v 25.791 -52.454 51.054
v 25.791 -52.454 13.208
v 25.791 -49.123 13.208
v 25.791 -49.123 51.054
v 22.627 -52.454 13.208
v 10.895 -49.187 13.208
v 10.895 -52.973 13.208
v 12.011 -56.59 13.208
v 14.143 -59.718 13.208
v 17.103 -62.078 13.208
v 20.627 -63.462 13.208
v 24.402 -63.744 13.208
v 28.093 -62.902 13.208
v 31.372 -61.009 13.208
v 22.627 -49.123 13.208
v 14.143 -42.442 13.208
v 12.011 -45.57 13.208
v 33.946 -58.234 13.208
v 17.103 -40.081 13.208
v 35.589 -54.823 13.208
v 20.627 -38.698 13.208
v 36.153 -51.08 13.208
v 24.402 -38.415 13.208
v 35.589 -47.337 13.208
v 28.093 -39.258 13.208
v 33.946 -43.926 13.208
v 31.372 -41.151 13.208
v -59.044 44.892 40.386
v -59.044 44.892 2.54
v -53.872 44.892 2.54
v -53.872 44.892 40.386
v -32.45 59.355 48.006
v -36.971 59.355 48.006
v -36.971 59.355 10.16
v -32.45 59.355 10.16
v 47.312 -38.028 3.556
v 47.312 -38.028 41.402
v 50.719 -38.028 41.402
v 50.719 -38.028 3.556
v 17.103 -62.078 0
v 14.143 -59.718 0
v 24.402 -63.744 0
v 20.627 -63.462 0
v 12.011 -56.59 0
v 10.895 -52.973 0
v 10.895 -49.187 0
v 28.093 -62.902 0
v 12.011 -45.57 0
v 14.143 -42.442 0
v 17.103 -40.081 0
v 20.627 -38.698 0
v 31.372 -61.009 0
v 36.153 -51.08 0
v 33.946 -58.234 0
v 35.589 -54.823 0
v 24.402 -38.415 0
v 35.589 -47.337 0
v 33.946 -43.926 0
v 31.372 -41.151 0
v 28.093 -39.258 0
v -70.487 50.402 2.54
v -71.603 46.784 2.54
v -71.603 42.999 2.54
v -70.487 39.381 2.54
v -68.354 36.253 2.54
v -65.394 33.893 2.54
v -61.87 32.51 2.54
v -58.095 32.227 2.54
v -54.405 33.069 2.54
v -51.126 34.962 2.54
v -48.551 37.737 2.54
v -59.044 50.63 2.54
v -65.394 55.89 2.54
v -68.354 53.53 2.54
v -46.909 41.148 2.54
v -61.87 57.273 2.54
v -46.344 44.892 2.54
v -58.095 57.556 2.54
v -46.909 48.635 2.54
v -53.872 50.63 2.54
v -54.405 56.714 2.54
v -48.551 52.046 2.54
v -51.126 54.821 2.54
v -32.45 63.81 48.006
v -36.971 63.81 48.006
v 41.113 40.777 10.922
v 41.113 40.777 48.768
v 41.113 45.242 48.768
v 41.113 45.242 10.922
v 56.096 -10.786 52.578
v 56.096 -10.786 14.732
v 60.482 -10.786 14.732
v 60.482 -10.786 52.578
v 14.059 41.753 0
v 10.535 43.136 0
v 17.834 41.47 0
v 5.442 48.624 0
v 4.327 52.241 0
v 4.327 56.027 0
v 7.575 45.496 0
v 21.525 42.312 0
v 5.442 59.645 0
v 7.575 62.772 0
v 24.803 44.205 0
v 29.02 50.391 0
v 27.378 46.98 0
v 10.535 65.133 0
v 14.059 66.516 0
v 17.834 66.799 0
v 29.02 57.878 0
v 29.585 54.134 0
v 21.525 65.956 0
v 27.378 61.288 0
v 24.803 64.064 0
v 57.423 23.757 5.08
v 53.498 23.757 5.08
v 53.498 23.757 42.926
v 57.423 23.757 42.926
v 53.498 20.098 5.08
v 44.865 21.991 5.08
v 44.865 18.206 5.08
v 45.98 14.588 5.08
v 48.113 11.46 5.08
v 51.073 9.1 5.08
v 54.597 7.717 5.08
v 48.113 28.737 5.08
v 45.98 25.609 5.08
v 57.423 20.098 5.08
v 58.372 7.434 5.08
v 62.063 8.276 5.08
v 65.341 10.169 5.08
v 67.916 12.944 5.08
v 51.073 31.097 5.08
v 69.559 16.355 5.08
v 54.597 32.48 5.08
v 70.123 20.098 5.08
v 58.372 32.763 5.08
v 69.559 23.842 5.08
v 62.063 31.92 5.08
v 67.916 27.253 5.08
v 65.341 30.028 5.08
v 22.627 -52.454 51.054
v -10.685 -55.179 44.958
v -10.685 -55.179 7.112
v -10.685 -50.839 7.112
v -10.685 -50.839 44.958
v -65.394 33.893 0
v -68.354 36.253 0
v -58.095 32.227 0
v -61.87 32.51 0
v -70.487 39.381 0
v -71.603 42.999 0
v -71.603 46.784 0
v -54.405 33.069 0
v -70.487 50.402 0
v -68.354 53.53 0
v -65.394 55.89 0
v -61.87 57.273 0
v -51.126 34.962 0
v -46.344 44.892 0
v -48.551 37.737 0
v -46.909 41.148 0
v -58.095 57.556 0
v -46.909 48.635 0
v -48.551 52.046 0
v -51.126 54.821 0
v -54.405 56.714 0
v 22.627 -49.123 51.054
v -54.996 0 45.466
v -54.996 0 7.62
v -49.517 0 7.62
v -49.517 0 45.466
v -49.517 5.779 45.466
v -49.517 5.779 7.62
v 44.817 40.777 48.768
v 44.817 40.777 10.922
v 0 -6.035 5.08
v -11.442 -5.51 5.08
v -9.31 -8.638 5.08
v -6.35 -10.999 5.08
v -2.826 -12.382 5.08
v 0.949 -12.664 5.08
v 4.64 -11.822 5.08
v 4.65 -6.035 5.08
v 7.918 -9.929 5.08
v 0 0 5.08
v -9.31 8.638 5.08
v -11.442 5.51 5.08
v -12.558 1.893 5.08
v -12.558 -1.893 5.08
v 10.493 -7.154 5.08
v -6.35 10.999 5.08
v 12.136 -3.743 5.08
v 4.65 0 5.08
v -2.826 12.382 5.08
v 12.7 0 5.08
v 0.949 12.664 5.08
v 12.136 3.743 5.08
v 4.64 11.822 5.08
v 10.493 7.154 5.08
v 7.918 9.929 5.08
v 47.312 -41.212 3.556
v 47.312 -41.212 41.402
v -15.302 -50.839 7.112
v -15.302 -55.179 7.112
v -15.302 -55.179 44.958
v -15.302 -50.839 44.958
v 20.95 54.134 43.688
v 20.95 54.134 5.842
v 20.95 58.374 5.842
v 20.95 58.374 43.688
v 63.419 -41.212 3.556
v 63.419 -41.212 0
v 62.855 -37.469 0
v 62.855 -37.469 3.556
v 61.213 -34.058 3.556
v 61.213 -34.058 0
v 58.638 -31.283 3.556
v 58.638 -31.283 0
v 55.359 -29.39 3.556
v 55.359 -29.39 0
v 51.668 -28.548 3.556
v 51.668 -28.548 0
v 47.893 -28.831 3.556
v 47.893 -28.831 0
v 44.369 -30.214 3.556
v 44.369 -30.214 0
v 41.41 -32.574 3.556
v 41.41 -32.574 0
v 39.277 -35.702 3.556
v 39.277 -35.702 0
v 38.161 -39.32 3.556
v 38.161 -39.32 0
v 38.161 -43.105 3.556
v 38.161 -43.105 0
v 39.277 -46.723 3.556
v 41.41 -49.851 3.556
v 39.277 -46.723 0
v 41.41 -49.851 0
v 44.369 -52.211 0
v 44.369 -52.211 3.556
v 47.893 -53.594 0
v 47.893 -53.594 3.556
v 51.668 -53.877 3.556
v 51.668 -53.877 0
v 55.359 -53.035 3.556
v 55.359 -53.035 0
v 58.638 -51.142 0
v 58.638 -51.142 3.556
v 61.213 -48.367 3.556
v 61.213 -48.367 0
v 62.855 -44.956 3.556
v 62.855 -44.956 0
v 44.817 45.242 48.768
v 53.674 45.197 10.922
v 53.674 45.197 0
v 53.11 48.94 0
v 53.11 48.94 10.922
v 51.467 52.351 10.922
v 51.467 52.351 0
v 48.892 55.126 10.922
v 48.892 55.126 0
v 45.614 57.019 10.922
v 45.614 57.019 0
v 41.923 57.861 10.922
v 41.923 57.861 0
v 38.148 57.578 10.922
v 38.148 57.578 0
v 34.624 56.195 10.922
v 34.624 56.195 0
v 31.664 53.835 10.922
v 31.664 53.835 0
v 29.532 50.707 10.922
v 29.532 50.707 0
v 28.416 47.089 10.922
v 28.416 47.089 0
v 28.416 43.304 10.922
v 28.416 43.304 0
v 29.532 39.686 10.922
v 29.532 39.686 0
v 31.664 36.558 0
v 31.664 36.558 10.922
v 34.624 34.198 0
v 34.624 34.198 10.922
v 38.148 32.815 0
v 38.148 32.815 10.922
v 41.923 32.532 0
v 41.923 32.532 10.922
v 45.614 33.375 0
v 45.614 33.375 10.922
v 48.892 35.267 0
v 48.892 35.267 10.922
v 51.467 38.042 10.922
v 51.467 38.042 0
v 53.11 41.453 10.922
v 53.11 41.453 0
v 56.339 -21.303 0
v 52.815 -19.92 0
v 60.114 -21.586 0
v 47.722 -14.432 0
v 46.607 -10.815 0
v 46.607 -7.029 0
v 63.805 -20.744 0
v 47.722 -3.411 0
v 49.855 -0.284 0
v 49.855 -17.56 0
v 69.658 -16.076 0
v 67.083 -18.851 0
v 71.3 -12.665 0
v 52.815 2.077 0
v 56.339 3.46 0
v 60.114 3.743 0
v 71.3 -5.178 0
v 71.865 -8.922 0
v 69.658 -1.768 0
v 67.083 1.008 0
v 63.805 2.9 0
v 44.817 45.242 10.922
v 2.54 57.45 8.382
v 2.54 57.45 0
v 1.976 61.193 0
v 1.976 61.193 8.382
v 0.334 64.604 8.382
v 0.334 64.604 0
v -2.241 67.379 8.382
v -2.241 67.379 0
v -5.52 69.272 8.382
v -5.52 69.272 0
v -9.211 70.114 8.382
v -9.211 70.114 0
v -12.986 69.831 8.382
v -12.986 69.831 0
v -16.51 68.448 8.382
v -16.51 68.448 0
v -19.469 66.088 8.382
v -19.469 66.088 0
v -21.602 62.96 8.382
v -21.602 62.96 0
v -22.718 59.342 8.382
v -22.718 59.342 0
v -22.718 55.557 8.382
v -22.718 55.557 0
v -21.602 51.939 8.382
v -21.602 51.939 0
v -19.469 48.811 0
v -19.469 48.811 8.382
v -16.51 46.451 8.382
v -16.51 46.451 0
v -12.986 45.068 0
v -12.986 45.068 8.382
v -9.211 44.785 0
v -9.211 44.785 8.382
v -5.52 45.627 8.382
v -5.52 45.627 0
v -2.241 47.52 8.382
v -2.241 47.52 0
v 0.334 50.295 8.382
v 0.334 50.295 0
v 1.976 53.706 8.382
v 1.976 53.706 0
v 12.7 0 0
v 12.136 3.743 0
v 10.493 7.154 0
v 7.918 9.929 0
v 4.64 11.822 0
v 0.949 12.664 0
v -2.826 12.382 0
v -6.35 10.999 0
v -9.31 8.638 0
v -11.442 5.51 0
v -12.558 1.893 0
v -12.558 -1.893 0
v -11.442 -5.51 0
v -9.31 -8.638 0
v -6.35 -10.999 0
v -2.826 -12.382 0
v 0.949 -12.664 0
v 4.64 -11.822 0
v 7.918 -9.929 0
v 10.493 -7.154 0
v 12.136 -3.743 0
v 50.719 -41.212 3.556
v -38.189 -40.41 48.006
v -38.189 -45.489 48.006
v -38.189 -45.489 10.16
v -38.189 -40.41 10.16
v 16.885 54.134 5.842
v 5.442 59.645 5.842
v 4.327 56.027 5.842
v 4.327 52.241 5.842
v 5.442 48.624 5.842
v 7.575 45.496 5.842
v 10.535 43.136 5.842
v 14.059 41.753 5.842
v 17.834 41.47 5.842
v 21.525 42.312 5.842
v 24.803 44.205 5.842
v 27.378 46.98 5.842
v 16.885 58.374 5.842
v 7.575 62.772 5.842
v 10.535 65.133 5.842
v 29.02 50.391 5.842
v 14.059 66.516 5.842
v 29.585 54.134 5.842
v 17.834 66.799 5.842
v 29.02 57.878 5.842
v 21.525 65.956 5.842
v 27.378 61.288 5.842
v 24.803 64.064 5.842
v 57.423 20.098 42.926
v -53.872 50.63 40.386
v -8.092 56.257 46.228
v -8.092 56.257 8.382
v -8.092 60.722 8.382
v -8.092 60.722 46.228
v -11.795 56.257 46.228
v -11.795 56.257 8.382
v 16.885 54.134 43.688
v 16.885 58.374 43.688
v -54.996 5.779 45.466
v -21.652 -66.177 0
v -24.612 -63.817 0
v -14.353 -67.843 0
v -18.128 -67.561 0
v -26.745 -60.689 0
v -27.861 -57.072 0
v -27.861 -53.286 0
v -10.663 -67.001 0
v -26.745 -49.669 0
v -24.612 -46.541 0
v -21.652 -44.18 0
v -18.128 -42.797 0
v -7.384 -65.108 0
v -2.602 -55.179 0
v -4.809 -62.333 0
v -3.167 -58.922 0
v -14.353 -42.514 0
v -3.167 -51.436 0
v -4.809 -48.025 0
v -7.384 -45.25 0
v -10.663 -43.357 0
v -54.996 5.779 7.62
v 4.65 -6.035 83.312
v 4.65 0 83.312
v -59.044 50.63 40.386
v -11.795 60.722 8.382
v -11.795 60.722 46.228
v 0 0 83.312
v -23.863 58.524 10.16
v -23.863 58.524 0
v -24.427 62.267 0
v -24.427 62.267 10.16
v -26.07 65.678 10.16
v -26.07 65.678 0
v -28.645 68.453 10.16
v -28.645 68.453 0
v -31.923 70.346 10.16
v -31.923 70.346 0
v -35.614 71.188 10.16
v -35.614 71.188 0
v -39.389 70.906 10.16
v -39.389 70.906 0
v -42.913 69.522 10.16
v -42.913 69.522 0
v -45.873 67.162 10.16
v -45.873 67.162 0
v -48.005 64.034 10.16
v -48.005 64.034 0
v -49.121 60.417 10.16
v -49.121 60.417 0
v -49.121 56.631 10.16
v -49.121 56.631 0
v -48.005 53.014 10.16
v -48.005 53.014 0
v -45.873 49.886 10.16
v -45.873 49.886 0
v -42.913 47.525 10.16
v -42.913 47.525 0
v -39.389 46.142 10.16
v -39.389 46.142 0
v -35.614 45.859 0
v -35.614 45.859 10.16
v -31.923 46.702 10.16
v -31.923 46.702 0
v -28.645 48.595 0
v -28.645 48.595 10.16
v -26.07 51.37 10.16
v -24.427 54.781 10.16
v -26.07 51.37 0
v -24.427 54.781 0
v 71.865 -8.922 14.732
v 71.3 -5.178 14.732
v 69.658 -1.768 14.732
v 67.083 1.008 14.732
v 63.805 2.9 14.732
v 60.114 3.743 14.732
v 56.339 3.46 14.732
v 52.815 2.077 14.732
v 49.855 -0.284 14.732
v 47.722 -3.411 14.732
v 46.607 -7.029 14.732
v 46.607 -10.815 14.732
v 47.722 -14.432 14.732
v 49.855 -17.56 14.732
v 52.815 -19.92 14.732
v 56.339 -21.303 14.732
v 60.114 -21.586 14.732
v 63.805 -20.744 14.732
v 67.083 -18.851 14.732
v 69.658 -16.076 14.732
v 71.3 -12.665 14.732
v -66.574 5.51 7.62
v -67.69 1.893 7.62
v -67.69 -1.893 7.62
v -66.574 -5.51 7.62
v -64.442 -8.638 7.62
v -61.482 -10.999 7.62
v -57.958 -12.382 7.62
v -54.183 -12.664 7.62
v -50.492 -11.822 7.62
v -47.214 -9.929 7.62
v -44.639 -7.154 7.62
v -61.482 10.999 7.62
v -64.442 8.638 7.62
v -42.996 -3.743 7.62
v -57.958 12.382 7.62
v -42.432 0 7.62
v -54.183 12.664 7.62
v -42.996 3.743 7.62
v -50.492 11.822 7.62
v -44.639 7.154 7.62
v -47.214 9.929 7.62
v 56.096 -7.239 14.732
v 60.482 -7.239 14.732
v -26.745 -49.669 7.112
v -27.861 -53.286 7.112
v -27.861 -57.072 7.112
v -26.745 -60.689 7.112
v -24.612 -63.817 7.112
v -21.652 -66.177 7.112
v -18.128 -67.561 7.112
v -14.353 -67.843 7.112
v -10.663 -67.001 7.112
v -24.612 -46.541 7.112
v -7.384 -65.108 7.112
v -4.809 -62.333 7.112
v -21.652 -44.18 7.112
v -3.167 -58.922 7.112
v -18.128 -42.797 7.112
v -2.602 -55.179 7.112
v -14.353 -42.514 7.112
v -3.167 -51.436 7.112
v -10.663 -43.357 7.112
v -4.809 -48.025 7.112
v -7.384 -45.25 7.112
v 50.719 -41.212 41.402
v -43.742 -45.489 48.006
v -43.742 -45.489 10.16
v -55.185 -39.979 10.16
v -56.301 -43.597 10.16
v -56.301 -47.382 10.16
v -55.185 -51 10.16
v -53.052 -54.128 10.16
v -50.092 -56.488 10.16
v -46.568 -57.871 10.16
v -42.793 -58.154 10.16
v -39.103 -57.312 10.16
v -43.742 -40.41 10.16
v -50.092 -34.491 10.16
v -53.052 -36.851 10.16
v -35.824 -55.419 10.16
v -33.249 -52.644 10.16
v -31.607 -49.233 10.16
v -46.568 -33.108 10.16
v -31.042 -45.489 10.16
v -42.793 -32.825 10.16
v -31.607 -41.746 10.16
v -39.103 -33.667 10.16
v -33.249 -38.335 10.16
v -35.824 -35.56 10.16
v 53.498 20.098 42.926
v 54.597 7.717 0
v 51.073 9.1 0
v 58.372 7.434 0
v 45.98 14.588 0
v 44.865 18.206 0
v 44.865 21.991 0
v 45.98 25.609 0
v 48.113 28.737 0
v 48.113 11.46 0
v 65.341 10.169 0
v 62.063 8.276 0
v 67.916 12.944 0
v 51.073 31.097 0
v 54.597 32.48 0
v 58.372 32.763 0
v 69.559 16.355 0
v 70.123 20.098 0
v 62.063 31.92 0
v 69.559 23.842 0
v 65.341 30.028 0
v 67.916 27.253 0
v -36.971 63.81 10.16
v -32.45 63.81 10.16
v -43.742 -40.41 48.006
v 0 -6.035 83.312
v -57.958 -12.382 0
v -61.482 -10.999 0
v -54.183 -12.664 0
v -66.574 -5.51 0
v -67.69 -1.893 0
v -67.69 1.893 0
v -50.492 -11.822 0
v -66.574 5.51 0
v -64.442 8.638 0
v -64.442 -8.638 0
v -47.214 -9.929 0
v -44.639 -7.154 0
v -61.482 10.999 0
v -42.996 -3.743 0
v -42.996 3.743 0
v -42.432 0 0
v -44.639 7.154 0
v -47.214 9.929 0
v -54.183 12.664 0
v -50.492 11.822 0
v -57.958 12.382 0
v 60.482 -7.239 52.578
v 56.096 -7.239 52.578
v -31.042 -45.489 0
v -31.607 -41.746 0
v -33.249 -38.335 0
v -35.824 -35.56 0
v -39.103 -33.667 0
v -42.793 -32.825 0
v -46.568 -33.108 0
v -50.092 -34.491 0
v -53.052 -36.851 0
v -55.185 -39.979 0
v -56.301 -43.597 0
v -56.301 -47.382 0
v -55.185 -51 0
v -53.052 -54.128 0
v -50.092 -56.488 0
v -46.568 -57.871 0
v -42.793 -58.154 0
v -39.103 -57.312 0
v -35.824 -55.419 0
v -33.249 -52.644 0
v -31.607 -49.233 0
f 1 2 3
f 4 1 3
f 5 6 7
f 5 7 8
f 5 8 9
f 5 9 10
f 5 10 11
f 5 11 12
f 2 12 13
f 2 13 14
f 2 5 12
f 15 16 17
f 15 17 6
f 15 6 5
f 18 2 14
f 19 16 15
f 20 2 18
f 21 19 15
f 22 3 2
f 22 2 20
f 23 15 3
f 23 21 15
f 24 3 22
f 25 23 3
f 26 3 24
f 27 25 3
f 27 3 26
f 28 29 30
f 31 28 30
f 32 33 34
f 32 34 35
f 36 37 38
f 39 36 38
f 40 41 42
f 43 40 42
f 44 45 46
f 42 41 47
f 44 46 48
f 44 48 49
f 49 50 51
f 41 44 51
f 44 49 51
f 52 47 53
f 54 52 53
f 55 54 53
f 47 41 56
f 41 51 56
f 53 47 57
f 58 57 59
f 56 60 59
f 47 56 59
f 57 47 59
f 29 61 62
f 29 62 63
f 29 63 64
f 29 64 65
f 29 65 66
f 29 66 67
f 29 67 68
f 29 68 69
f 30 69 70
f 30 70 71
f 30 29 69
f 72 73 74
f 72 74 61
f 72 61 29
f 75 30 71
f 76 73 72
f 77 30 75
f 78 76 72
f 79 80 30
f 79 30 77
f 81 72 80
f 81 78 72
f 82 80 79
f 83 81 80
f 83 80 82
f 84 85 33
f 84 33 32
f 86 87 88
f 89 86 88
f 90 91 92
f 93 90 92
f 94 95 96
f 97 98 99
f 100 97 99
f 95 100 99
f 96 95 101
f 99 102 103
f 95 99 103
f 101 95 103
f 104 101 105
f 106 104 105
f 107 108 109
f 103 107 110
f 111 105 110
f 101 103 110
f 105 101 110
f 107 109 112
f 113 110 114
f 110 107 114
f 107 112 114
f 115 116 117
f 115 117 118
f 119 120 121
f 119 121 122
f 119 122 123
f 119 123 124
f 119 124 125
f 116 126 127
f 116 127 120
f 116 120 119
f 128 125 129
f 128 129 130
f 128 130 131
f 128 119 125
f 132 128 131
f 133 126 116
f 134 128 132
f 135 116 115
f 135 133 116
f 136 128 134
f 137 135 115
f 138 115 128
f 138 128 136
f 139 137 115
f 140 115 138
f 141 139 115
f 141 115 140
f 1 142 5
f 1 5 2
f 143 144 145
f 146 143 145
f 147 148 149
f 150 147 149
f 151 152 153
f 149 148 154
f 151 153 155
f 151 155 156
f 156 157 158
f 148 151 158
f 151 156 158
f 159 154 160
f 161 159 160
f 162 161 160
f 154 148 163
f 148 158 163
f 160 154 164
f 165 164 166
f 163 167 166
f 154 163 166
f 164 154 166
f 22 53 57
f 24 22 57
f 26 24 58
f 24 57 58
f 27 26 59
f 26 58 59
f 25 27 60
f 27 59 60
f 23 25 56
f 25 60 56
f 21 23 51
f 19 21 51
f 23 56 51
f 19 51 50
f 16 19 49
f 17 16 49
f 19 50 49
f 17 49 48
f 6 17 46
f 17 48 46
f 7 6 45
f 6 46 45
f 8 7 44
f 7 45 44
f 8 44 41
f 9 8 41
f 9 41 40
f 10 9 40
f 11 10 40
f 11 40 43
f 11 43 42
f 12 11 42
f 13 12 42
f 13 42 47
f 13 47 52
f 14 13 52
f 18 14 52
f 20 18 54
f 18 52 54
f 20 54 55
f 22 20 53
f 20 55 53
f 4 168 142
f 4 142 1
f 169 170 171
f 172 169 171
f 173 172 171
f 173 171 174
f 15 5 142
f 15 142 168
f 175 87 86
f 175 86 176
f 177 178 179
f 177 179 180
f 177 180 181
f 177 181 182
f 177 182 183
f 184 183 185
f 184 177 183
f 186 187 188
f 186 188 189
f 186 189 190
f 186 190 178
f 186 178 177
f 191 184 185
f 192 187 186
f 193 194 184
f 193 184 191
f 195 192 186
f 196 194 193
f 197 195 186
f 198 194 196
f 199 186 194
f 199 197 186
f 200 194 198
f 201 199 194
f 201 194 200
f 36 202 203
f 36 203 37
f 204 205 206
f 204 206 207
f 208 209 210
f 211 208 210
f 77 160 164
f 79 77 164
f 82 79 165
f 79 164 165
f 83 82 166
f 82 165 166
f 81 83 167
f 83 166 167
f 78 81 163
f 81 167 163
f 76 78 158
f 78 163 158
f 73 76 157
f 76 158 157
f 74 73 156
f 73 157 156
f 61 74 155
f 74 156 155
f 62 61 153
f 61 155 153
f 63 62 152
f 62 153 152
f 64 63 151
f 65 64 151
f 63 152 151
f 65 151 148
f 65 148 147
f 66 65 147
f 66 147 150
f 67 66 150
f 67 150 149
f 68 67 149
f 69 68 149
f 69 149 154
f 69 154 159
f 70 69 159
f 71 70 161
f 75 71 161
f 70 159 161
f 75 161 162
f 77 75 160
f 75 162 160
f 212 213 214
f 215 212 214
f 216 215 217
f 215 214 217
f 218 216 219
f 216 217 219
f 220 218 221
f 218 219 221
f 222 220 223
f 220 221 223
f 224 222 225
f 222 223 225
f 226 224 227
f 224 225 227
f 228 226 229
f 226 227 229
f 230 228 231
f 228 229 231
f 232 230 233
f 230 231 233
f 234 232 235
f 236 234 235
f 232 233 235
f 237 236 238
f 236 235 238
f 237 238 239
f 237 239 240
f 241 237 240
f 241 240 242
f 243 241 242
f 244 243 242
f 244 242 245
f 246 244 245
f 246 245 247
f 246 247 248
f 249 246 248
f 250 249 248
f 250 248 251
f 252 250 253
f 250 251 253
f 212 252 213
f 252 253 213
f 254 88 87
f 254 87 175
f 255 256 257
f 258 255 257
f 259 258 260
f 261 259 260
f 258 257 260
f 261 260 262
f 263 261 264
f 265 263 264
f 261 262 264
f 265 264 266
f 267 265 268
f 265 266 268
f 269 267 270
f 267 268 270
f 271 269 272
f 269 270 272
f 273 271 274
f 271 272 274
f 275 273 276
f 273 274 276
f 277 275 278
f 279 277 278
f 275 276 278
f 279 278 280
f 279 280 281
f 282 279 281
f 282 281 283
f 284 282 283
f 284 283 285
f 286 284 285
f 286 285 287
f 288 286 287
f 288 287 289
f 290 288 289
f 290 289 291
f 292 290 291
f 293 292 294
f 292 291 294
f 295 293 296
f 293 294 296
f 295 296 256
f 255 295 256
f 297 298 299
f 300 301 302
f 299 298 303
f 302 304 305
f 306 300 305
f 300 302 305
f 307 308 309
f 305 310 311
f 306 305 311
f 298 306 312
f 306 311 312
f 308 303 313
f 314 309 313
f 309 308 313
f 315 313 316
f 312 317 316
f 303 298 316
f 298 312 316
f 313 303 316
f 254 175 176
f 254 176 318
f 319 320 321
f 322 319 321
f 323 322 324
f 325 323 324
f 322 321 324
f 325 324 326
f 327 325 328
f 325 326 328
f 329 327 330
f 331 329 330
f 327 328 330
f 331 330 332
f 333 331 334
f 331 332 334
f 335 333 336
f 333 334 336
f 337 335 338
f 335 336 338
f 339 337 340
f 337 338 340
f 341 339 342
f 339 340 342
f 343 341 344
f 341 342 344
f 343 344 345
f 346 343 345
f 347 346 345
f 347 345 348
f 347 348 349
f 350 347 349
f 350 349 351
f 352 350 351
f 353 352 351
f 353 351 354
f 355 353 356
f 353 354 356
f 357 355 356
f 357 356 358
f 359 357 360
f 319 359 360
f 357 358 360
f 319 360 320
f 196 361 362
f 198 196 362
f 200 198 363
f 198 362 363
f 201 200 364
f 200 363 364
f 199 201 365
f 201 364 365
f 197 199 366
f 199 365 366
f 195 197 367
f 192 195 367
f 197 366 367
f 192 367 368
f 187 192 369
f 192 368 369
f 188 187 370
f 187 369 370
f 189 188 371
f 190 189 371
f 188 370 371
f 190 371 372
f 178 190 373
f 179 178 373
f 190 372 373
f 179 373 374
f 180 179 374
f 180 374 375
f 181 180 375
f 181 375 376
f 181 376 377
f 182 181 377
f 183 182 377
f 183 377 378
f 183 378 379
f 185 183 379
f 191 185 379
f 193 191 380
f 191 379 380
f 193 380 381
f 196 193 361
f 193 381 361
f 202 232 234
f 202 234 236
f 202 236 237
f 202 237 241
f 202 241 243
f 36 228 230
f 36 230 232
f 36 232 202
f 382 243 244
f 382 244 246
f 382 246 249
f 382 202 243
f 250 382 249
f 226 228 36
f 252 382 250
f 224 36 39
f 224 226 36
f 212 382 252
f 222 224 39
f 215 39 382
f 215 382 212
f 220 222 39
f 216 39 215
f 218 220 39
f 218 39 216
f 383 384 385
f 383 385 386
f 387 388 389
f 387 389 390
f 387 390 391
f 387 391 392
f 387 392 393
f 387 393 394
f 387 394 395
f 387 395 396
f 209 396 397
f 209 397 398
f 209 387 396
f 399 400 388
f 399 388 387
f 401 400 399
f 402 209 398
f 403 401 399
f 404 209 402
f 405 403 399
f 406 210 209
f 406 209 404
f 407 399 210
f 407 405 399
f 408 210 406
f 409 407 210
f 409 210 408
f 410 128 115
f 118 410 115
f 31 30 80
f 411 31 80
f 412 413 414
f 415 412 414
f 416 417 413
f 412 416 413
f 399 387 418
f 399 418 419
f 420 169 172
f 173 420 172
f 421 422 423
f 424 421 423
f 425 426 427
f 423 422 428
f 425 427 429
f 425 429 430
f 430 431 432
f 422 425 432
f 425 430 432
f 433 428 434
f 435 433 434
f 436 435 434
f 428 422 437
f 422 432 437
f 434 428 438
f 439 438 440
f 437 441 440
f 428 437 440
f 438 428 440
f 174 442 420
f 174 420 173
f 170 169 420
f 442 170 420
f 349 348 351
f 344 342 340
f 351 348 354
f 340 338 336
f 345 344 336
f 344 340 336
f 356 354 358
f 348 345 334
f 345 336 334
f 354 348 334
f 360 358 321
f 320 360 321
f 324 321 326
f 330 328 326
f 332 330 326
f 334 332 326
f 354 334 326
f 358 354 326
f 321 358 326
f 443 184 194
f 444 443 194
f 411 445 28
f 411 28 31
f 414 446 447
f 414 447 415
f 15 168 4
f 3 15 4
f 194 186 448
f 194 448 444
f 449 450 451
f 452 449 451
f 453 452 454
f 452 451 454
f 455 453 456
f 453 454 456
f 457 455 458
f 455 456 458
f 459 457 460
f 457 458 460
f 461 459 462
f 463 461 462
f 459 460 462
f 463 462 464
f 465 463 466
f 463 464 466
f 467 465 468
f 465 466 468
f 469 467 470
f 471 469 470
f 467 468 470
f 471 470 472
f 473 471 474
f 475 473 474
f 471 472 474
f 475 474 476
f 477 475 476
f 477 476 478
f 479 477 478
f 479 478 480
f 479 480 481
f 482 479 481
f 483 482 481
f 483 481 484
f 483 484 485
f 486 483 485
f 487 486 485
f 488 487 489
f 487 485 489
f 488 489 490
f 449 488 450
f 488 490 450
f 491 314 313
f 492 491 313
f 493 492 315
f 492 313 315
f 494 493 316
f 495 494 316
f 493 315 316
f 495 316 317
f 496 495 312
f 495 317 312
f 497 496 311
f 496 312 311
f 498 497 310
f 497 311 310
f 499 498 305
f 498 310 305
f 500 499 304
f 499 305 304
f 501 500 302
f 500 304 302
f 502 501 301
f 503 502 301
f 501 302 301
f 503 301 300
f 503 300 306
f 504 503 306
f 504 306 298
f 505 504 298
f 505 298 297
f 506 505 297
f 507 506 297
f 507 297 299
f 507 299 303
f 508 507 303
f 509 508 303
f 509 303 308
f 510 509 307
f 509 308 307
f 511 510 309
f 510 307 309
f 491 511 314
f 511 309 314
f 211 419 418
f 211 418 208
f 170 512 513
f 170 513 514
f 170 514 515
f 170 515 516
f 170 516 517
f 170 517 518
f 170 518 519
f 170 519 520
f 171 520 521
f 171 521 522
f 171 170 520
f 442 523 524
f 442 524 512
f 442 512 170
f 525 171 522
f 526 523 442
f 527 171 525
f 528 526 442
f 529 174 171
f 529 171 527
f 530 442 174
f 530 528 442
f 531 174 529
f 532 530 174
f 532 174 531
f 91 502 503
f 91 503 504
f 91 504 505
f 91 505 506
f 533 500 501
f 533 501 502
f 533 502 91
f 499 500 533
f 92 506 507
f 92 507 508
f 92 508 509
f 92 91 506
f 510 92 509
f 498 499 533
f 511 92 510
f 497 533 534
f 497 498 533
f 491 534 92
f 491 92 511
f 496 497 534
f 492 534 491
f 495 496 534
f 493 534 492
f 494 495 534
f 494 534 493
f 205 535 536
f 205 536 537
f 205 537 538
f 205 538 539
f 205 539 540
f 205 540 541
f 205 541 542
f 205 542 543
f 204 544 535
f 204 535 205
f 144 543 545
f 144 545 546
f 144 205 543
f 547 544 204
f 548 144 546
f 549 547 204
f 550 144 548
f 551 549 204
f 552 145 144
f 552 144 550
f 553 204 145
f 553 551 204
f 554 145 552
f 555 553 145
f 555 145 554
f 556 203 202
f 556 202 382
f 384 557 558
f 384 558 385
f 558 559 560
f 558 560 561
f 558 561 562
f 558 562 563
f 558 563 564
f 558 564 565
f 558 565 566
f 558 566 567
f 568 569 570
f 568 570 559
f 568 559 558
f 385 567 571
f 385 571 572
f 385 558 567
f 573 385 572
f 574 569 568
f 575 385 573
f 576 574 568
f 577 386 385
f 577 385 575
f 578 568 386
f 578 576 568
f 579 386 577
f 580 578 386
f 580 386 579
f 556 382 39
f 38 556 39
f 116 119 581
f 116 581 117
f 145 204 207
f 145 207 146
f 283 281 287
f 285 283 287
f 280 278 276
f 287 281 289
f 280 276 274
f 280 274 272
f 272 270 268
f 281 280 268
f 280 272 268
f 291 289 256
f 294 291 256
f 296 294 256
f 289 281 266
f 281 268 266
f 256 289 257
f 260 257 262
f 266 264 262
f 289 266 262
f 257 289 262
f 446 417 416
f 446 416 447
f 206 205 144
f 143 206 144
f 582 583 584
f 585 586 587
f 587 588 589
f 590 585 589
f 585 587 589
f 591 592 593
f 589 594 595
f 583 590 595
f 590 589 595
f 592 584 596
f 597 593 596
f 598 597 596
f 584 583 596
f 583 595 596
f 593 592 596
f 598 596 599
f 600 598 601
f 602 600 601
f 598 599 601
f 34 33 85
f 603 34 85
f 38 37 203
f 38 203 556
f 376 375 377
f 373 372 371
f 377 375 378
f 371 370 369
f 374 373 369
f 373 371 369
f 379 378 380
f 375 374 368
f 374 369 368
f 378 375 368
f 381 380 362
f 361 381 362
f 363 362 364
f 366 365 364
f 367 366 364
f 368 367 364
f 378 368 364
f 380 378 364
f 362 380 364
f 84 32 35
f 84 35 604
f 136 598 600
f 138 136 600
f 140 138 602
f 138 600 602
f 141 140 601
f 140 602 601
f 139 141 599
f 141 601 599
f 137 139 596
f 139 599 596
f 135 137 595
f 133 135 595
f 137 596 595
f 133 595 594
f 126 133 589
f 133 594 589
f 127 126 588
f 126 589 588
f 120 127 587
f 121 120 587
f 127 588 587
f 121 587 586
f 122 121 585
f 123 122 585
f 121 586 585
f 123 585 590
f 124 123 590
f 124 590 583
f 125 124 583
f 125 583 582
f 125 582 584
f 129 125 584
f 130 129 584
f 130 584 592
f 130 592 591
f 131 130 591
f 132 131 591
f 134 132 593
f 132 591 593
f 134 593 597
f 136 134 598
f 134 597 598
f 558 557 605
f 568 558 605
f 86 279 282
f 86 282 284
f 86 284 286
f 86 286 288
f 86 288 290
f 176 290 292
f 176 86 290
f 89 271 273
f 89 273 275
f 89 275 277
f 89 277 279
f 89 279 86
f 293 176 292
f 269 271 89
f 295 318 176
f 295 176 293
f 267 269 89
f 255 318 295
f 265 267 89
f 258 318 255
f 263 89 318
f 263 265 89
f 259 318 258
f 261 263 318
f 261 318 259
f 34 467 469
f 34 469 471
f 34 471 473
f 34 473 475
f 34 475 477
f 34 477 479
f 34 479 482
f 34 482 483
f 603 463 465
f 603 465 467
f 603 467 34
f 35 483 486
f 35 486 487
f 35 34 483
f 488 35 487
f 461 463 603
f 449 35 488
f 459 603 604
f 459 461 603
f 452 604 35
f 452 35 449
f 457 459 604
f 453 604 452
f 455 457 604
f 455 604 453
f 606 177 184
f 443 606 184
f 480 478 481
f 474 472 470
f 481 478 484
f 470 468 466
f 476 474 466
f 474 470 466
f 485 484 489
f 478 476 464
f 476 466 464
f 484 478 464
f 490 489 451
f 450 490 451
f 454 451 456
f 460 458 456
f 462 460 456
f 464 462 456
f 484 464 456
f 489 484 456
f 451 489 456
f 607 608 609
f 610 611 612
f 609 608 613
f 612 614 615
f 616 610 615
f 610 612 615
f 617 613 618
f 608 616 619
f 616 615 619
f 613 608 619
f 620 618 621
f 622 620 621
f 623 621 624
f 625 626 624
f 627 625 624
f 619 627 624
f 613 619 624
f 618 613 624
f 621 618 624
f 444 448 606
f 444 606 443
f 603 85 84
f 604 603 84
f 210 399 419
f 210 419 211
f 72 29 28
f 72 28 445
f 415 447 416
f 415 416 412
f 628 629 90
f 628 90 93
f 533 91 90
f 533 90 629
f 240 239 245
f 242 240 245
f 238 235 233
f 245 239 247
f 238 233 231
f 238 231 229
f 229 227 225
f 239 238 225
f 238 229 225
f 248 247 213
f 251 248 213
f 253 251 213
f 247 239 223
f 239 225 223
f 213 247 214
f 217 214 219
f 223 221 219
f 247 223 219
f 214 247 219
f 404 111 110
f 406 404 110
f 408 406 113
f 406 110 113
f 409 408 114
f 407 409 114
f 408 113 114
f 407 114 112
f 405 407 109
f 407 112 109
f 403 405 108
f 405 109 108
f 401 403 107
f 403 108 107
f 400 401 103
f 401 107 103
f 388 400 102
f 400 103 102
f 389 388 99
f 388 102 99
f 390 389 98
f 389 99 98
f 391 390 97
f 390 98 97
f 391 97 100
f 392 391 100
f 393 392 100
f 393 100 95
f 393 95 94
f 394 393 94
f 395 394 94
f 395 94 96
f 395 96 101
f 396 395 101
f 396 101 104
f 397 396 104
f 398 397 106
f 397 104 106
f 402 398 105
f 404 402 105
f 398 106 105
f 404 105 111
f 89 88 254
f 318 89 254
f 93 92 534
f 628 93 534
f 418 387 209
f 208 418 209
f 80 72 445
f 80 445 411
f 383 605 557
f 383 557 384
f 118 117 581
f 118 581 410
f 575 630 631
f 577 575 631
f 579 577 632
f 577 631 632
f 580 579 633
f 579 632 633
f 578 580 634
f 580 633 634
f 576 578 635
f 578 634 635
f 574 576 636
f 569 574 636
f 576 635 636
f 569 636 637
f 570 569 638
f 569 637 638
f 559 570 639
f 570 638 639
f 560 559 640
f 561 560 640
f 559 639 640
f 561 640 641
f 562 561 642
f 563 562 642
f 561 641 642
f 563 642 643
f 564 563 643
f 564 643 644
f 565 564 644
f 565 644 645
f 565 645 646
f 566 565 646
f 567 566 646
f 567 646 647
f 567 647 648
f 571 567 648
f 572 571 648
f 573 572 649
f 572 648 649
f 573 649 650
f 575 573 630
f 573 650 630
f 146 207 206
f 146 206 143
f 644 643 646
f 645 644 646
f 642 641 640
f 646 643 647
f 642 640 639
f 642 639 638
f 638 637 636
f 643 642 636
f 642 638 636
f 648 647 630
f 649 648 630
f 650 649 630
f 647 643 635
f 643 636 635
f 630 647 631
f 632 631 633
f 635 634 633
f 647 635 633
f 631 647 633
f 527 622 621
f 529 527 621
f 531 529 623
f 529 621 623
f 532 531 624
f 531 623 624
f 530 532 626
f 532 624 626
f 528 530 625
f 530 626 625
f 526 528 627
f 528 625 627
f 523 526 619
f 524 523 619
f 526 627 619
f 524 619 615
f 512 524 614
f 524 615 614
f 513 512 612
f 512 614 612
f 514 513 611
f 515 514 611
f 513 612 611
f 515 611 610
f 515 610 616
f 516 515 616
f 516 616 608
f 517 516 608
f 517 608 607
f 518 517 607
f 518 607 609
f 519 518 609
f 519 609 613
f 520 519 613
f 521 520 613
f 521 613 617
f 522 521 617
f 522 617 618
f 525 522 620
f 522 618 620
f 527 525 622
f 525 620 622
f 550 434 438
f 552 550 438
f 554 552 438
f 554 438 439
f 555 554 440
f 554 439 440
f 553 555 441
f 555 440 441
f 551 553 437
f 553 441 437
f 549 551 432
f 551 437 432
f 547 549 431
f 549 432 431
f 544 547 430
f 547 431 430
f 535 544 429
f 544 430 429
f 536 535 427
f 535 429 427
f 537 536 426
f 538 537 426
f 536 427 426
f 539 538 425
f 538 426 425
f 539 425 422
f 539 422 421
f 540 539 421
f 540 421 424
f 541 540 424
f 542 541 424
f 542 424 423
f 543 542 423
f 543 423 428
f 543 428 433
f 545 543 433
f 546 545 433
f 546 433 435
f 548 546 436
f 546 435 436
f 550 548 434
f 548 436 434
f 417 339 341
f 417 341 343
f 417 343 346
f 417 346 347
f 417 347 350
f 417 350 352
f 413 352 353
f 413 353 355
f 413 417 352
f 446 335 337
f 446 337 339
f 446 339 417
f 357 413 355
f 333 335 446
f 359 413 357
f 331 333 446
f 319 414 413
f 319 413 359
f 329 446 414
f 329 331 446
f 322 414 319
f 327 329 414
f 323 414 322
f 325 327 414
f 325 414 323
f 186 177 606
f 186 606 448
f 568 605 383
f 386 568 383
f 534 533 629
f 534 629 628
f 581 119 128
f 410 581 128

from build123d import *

# Parameters (mm, degrees)
F1_R      = 12.7
F2_DEPTH  = 5.08
F3_R      = 12.7
F4_DEPTH  = 7.62
F5_R      = 12.7
F6_DEPTH  = 10.16
F7_R      = 12.7
F8_DEPTH  = 2.54
F9_R      = 12.7
F10_DEPTH = 10.16
F11_R     = 12.7
F12_DEPTH = 8.382
F13_R     = 12.7
F14_DEPTH = 5.842
F15_R     = 12.7
F16_DEPTH = 10.922
F17_R     = 12.7
F18_DEPTH = 5.08
F19_R     = 12.7
F20_DEPTH = 14.732
F21_R     = 12.7
F22_DEPTH = 3.556
F23_R     = 12.7
F24_DEPTH = 13.208
F25_R     = 12.7
F26_DEPTH = 7.112
F28_W     = 4.6502533369
F28_H     = 6.035386119
F29_DEPTH = 78.232
F30_W     = 5.5531486869
F30_H     = 5.0790570676
F31_DEPTH = 37.846
F33_W     = 5.4783672094
F33_H     = 5.7789068669
F34_DEPTH = 37.846
F35_W     = 5.1721557975
F35_H     = 5.7389475405
F36_DEPTH = 37.846
F37_W     = 4.5215077698
F37_H     = 4.4553652406
F38_DEPTH = 37.846
F39_W     = 3.7037907168
F39_H     = 4.4649019837
F40_DEPTH = 37.846
F41_W     = 4.065323621
F41_H     = 4.2393356562
F42_DEPTH = 37.846
F43_W     = 3.7037879229
F43_H     = 4.4649019837
F44_DEPTH = 37.846
F45_W     = 3.9252713323
F45_H     = 3.6589708179
F46_DEPTH = 37.846
F47_W     = 4.385560751
F47_H     = 3.5465881228
F48_DEPTH = 37.846
F49_W     = 3.4073777497
F49_H     = 3.1843148172
F50_DEPTH = 37.846
F51_W     = 3.1643118709
F51_H     = 3.3308565617
F52_DEPTH = 37.846
F53_W     = 4.6169674024
F53_H     = 4.3400600553
F54_DEPTH = 37.846


with BuildPart() as f2:
    # F1 (on face) → F2 (new body)
    with BuildSketch(Plane.XY):
        Circle(F1_R)
    extrude(amount=F2_DEPTH)

    # F28 (on face) → F29 (join)
    with BuildSketch(Plane.XY.offset(5.08)):
        with Locations((2.3251266684, -3.0176930595)):
            Rectangle(F28_W, F28_H)
    extrude(amount=F29_DEPTH)


with BuildPart() as f4:
    # F3 (on Top) → F4 (new body)
    with BuildSketch(Plane.XY):
        with Locations((-55.1319494843, 0)):
            Circle(F3_R)
    extrude(amount=F4_DEPTH)

    # F33 (on face) → F34 (join)
    with BuildSketch(Plane.XY.offset(7.62)):
        with Locations((-52.2565543652, 2.8894534335)):
            Rectangle(F33_W, F33_H)
    extrude(amount=F34_DEPTH)


with BuildPart() as f6:
    # F5 (on Top) → F6 (new body)
    with BuildSketch(Plane.XY):
        with Locations((-43.742377311, -45.489422977)):
            Circle(F5_R)
    extrude(amount=F6_DEPTH)

    # F30 (on face) → F31 (join)
    with BuildSketch(Plane.XY.offset(10.16)):
        with Locations((-40.9658029675, -42.9498944432)):
            Rectangle(F30_W, F30_H)
    extrude(amount=F31_DEPTH)


with BuildPart() as f8:
    # F7 (on Top) → F8 (new body)
    with BuildSketch(Plane.XY):
        with Locations((-59.0443722904, 44.8915213346)):
            Circle(F7_R)
    extrude(amount=F8_DEPTH)

    # F35 (on face) → F36 (join)
    with BuildSketch(Plane.XY.offset(2.54)):
        with Locations((-56.4582943916, 47.7609951049)):
            Rectangle(F35_W, F35_H)
    extrude(amount=F36_DEPTH)


with BuildPart() as f10:
    # F9 (on Top) → F10 (new body)
    with BuildSketch(Plane.XY):
        with Locations((-36.562923342, 58.5239231586)):
            Circle(F9_R)
    extrude(amount=F10_DEPTH)

    # F37 (on face) → F38 (join)
    with BuildSketch(Plane.XY.offset(10.16)):
        with Locations((-34.710438922, 61.5828000009)):
            Rectangle(F37_W, F37_H)
    extrude(amount=F38_DEPTH)


with BuildPart() as f12:
    # F11 (on Top) → F12 (new body)
    with BuildSketch(Plane.XY):
        with Locations((-10.1596266031, 57.4495196342)):
            Circle(F11_R)
    extrude(amount=F12_DEPTH)

    # F39 (on face) → F40 (join)
    with BuildSketch(Plane.XY.offset(8.382)):
        with Locations((-9.9434540607, 58.4898106754)):
            Rectangle(F39_W, F39_H)
    extrude(amount=F40_DEPTH)


with BuildPart() as f14:
    # F13 (on Top) → F14 (new body)
    with BuildSketch(Plane.XY):
        with Locations((16.884688288, 54.1342832148)):
            Circle(F13_R)
    extrude(amount=F14_DEPTH)

    # F41 (on face) → F42 (join)
    with BuildSketch(Plane.XY.offset(5.842)):
        with Locations((18.9173500985, 56.2539510429)):
            Rectangle(F41_W, F41_H)
    extrude(amount=F42_DEPTH)


with BuildPart() as f16:
    # F15 (on Top) → F16 (new body)
    with BuildSketch(Plane.XY):
        with Locations((40.9741178155, 45.196633786)):
            Circle(F15_R)
    extrude(amount=F16_DEPTH)

    # F43 (on face) → F44 (join)
    with BuildSketch(Plane.XY.offset(10.922)):
        with Locations((42.9651290178, 43.0098474026)):
            Rectangle(F43_W, F43_H)
    extrude(amount=F44_DEPTH)


with BuildPart() as f18:
    # F17 (on Top) → F18 (new body)
    with BuildSketch(Plane.XY):
        with Locations((57.4227981269, 20.0983900577)):
            Circle(F17_R)
    extrude(amount=F18_DEPTH)

    # F45 (on face) → F46 (join)
    with BuildSketch(Plane.XY.offset(5.08)):
        with Locations((55.4601624608, 21.9278754666)):
            Rectangle(F45_W, F45_H)
    extrude(amount=F46_DEPTH)


with BuildPart() as f20:
    # F19 (on Top) → F20 (new body)
    with BuildSketch(Plane.XY):
        with Locations((59.1646693647, -8.9216995984)):
            Circle(F19_R)
    extrude(amount=F20_DEPTH)

    # F47 (on face) → F48 (join)
    with BuildSketch(Plane.XY.offset(14.732)):
        with Locations((58.28903988, -9.0126572177)):
            Rectangle(F47_W, F47_H)
    extrude(amount=F48_DEPTH)


with BuildPart() as f22:
    # F21 (on Top) → F22 (new body)
    with BuildSketch(Plane.XY):
        with Locations((50.719294697, -41.2124544382)):
            Circle(F21_R)
    extrude(amount=F22_DEPTH)

    # F49 (on face) → F50 (join)
    with BuildSketch(Plane.XY.offset(3.556)):
        with Locations((49.0156058222, -39.6202970296)):
            Rectangle(F49_W, F49_H)
    extrude(amount=F50_DEPTH)


with BuildPart() as f24:
    # F23 (on Top) → F24 (new body)
    with BuildSketch(Plane.XY):
        with Locations((23.4532225877, -51.079928875)):
            Circle(F23_R)
    extrude(amount=F24_DEPTH)

    # F51 (on face) → F52 (join)
    with BuildSketch(Plane.XY.offset(13.208)):
        with Locations((24.2088520899, -50.7884994149)):
            Rectangle(F51_W, F51_H)
    extrude(amount=F52_DEPTH)


with BuildPart() as f26:
    # F25 (on Top) → F26 (new body)
    with BuildSketch(Plane.XY):
        with Locations((-15.3024336323, -55.1789626479)):
            Circle(F25_R)
    extrude(amount=F26_DEPTH)

    # F53 (on face) → F54 (join)
    with BuildSketch(Plane.XY.offset(7.112)):
        with Locations((-12.9939499311, -53.0089326203)):
            Rectangle(F53_W, F53_H)
    extrude(amount=F54_DEPTH)


solid = Compound([f2.part, f4.part, f6.part, f8.part, f10.part, f12.part, f14.part, f16.part, f18.part, f20.part, f22.part, f24.part, f26.part])
